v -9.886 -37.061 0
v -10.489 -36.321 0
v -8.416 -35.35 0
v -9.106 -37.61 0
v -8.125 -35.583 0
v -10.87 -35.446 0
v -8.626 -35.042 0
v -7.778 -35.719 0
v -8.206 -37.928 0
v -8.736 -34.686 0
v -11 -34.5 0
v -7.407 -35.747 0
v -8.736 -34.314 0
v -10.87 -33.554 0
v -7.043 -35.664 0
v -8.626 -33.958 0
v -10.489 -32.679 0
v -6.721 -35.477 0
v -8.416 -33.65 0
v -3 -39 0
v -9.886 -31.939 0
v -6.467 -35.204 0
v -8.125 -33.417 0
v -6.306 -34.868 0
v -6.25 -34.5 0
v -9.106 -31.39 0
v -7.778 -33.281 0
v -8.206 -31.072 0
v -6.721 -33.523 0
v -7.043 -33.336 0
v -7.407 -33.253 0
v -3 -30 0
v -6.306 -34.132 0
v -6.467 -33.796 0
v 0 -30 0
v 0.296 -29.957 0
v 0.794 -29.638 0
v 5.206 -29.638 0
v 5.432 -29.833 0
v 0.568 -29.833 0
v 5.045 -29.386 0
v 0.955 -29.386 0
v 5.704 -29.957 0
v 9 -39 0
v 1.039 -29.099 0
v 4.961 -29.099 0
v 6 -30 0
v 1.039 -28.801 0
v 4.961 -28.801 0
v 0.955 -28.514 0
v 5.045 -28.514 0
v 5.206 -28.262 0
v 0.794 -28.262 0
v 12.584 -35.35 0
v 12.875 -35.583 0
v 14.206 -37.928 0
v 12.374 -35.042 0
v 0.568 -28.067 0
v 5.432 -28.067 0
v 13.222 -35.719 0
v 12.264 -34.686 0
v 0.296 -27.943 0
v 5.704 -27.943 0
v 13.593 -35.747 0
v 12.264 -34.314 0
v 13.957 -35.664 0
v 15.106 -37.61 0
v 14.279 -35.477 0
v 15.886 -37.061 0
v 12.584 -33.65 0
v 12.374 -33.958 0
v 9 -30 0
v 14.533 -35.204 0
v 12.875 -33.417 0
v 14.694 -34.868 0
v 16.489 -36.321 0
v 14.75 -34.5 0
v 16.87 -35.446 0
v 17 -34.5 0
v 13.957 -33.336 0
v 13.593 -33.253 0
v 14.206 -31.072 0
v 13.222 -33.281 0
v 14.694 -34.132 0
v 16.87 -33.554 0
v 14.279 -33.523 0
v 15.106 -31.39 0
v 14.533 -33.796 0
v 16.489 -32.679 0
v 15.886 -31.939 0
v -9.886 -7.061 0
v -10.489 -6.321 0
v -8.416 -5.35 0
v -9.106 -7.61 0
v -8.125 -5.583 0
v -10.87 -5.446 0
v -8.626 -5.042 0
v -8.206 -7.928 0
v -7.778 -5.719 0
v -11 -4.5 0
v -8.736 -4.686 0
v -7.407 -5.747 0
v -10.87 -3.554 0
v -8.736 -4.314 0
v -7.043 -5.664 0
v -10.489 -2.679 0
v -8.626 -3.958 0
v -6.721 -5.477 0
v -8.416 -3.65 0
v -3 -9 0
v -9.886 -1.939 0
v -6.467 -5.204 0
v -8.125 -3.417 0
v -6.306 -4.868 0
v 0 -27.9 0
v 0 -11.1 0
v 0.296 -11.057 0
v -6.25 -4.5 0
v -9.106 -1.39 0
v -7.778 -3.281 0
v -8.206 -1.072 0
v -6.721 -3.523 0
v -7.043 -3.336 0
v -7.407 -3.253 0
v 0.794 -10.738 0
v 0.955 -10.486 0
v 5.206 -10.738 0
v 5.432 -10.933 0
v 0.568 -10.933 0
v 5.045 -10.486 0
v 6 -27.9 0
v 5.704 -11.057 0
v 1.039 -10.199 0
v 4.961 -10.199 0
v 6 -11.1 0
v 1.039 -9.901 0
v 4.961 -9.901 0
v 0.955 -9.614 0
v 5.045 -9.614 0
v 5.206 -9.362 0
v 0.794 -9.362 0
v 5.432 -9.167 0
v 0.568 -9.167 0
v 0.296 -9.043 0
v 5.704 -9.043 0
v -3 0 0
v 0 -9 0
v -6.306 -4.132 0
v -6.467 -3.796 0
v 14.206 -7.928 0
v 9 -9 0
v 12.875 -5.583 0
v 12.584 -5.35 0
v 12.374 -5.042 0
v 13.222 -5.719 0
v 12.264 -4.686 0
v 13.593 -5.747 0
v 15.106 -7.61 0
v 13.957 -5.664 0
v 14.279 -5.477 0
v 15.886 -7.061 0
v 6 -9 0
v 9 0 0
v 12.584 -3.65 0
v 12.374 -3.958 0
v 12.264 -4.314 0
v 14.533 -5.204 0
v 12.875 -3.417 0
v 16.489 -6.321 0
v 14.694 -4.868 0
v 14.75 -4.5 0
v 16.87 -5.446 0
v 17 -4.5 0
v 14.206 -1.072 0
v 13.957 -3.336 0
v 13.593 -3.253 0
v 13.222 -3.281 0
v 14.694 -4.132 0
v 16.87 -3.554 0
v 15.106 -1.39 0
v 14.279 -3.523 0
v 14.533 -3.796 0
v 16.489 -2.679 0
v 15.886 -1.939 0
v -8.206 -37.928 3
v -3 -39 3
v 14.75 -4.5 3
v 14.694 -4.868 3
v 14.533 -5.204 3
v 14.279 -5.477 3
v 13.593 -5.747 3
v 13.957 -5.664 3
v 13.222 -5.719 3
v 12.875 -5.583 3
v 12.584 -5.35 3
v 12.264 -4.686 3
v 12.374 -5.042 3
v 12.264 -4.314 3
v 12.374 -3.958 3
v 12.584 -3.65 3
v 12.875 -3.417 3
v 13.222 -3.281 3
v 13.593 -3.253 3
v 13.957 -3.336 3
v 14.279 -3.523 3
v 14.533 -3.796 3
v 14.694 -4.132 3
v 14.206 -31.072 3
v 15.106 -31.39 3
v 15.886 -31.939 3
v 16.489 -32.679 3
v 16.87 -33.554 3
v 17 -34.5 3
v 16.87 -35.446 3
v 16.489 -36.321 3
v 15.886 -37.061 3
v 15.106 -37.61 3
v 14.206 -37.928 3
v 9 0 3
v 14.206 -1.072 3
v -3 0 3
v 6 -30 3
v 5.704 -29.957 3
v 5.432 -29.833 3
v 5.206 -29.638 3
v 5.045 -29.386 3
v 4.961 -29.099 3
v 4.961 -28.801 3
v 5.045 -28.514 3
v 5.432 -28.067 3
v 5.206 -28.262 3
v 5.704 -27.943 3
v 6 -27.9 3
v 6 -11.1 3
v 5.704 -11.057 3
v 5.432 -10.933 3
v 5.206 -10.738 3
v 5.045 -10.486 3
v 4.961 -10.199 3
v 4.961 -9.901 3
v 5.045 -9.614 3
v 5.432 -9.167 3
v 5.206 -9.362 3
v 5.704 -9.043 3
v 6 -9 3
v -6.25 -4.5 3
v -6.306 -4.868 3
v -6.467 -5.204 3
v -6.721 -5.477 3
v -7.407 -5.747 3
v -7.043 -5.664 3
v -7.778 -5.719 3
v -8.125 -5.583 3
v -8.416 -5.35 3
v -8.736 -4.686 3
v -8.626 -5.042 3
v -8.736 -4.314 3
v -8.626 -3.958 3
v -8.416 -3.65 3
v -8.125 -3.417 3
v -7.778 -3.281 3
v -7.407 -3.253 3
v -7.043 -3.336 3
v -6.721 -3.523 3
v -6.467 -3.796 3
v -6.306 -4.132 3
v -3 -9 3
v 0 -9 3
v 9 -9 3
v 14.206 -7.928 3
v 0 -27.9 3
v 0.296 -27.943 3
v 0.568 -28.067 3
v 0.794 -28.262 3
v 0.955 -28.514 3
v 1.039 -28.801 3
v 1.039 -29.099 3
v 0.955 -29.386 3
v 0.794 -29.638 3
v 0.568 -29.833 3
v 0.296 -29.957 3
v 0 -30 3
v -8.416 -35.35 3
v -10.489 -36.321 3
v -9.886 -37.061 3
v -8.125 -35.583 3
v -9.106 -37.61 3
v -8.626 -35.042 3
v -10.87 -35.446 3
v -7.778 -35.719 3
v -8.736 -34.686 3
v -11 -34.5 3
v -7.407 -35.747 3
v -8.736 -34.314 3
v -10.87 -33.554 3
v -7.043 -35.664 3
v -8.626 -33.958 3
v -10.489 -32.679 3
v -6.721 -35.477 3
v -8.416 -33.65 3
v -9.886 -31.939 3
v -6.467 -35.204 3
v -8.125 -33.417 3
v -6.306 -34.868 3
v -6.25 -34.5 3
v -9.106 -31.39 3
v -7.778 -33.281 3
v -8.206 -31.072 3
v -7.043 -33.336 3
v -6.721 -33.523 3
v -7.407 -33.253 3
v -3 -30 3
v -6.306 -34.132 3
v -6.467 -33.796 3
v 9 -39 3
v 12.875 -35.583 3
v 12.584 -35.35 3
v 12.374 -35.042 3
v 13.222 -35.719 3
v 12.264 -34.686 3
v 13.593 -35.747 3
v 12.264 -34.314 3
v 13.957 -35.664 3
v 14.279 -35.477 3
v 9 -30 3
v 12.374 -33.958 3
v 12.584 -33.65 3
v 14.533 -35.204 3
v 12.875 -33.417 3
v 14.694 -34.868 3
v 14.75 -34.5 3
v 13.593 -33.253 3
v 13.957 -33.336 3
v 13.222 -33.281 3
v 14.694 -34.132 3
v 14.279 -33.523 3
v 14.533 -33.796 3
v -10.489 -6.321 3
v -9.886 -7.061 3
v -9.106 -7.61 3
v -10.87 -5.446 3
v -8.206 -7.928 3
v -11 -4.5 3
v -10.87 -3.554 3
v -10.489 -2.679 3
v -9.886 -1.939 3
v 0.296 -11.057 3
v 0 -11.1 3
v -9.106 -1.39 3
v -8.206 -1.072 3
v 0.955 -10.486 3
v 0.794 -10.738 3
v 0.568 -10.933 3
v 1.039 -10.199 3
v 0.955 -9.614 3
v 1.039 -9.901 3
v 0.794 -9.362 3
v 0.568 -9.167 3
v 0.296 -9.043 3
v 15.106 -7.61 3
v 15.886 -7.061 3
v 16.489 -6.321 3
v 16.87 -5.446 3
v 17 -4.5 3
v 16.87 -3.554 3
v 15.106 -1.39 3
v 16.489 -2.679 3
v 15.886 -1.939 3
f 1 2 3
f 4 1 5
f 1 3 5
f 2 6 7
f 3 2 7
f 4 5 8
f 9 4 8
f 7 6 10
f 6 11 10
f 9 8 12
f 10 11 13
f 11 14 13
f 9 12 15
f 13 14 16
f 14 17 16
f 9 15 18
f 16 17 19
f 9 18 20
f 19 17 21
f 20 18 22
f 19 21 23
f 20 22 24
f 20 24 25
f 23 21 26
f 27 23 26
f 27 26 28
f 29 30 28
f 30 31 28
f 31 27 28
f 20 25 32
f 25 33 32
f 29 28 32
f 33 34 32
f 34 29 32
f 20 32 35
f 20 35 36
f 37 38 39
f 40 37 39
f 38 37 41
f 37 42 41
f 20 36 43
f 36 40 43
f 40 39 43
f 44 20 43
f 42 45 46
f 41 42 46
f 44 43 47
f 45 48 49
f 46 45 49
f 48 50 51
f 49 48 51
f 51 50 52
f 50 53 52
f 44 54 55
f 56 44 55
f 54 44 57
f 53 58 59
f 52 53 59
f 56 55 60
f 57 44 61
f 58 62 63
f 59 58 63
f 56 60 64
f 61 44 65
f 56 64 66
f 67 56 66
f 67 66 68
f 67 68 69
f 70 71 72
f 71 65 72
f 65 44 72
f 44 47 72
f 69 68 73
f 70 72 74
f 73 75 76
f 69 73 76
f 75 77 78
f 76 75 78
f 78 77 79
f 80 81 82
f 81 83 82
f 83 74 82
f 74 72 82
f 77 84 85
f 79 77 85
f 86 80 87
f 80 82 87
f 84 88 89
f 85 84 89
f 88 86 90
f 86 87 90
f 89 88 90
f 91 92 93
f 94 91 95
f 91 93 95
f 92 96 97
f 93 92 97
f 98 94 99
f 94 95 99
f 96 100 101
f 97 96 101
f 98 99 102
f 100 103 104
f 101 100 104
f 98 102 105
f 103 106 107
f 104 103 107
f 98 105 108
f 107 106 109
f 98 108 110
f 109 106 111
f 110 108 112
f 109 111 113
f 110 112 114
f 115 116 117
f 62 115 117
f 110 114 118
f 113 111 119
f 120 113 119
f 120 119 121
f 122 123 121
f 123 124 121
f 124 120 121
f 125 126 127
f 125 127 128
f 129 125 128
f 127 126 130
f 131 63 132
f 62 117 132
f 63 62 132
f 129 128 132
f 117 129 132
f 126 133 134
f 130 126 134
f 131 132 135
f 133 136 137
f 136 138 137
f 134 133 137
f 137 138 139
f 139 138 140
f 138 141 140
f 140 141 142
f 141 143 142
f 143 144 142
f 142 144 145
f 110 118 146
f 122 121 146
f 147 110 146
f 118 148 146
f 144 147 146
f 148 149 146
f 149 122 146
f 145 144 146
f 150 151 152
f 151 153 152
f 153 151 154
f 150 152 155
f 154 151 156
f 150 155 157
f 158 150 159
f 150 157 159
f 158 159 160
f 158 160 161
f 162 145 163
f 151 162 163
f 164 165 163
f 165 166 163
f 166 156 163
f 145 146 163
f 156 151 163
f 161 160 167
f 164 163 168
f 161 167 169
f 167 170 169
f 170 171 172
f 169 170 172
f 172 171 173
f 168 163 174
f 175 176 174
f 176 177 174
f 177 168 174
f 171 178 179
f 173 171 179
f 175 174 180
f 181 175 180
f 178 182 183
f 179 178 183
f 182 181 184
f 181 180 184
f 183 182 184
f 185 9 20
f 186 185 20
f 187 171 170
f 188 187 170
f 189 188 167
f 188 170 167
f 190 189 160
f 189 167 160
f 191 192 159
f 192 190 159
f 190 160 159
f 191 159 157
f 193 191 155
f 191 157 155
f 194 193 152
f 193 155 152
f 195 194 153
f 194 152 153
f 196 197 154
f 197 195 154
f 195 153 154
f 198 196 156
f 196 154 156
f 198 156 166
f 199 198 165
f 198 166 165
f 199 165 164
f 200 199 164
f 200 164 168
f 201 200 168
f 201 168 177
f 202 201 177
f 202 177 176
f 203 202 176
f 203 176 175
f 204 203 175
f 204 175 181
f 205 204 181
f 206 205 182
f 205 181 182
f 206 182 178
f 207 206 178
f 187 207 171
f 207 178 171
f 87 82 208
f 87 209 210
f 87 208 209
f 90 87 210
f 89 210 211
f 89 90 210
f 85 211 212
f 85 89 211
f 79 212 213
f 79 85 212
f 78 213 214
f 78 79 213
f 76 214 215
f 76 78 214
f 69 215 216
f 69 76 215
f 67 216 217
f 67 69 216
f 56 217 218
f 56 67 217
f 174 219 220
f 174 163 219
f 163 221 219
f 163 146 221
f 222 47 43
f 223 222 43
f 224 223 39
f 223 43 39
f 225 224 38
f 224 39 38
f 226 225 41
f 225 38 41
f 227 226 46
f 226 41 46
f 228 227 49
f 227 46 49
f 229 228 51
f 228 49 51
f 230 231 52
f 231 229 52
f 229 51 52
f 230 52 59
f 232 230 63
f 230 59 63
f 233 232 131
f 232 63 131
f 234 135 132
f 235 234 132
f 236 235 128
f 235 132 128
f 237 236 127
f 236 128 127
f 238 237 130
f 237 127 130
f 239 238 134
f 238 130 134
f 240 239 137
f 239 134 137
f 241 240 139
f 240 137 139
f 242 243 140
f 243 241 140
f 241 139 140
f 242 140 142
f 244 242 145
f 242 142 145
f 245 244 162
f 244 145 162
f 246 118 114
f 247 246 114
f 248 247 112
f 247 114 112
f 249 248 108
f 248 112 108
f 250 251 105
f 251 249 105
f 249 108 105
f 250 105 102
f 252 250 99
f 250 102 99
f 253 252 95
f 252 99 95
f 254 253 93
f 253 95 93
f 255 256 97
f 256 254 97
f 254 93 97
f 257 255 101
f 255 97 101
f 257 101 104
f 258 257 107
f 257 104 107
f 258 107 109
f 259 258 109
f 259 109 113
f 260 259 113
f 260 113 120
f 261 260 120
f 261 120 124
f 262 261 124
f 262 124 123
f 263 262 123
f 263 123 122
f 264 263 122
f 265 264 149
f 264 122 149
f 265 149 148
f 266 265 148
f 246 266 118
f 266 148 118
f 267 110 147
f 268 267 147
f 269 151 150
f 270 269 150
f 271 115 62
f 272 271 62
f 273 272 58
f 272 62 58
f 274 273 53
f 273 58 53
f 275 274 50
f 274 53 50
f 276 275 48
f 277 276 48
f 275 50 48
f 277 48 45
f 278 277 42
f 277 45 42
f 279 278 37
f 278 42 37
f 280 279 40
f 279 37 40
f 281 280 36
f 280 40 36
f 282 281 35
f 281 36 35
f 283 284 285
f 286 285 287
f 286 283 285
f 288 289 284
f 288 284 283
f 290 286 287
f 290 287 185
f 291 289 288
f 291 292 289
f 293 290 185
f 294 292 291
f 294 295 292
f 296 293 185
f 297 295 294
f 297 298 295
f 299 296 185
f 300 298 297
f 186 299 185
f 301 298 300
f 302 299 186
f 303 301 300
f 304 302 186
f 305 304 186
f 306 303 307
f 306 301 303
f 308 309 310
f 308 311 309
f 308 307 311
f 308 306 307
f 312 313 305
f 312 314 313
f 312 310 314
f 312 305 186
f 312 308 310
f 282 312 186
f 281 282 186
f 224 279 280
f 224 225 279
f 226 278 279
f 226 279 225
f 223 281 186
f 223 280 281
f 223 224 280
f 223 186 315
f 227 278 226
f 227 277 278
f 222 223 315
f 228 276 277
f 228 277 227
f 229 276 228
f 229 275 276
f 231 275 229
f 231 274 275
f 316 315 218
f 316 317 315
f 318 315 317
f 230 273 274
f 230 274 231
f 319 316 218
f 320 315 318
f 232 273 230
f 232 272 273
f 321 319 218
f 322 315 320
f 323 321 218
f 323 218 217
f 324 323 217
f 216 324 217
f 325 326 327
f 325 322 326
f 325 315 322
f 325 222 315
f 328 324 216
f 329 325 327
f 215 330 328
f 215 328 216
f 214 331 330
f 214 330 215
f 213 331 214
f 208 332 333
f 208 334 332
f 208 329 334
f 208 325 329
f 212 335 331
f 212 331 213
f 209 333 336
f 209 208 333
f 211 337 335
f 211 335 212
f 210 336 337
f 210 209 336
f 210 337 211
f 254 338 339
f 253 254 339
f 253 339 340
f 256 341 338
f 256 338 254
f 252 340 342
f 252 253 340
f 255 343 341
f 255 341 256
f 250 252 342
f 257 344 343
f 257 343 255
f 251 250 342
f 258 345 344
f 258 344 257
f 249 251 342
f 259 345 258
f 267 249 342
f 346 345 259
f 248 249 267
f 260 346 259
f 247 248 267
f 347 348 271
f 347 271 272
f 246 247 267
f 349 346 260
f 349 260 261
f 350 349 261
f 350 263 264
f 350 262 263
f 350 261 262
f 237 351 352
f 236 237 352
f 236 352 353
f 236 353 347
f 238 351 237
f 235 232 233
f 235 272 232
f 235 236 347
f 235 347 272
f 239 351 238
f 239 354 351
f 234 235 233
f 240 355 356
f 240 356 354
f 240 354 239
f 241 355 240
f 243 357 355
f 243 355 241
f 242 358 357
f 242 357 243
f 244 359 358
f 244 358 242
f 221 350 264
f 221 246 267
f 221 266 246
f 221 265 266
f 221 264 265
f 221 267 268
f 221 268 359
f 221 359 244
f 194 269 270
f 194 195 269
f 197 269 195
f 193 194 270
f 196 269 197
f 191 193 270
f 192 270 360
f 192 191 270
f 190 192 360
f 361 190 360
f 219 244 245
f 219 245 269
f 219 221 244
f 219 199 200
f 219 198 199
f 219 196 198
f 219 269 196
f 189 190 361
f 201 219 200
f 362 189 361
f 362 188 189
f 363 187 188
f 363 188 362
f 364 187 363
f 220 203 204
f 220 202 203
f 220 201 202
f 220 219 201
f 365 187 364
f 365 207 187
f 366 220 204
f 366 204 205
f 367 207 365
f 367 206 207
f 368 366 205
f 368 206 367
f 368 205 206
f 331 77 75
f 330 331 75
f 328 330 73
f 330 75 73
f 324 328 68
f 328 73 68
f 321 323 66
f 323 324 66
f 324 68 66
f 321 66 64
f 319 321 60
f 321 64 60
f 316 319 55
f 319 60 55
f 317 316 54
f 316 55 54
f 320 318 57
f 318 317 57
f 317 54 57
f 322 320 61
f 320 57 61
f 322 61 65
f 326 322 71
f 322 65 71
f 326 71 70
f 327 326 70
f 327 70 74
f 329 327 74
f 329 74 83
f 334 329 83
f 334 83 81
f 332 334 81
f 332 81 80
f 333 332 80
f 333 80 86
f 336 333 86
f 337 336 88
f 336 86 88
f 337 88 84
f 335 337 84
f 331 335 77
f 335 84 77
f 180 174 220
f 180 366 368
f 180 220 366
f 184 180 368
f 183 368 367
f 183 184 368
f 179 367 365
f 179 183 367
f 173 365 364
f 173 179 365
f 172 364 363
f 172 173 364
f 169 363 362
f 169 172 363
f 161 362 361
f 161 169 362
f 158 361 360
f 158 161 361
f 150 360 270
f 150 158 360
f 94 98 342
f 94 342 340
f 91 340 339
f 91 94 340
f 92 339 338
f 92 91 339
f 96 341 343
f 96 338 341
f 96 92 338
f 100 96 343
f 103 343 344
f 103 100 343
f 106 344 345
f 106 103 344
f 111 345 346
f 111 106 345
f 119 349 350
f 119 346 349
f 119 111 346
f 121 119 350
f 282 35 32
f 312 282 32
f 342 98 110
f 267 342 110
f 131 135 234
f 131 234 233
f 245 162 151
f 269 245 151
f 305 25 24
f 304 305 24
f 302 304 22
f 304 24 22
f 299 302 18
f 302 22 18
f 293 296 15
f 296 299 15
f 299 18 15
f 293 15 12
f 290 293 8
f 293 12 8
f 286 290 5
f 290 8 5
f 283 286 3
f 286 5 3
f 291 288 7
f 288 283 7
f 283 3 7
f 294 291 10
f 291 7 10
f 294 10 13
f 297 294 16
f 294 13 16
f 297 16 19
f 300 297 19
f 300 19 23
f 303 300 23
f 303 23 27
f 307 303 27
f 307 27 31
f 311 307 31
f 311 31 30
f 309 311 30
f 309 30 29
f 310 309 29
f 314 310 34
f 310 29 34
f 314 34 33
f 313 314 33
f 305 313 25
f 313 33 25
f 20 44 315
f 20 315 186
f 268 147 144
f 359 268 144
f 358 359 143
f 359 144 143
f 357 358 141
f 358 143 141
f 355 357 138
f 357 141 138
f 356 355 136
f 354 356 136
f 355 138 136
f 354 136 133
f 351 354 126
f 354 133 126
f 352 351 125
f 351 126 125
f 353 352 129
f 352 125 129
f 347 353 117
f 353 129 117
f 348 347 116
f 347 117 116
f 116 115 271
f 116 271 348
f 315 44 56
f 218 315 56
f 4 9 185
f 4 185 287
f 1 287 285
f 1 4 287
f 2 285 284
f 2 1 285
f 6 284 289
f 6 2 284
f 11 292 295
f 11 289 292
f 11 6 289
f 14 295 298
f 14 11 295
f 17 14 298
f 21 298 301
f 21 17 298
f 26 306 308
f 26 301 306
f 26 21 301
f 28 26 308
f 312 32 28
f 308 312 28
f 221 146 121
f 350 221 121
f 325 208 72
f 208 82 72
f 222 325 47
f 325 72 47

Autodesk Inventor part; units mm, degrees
ref_plane "YZ Plane" through (0, 0, 0) normal (1, 0, 0) x (0, 1, 0)
ref_plane "XZ Plane" through (0, 0, 0) normal (0, 1, 0) x (-1, 0, 0)
ref_plane "XY Plane" through (0, 0, 0) normal (0, 0, 1) x (1, 0, 0)
sketch "スケッチ1" plane through (0, 0, 0) normal (0, 0, 1) x (1, 0, 0)
  line L0 (0, 0) -> (6, 0)
  line L1 (6, 0) -> (6, -39)
  line L2 (6, -39) -> (0, -39)
  line L3 (0, -39) -> (0, 0)
  line L4 (6, 0) -> (9, 0)
  circle A0 centre (13.5, -4.5) radius 1.25
  circle A1 centre (-7.5, -4.5) radius 1.25
  circle A2 centre (-7.5, -34.5) radius 1.25
  circle A3 centre (13.5, -34.5) radius 1.25
  circle A4 centre (-7.5, -4.5) radius 3.5
  circle A5 centre (13.5, -4.5) radius 3.5
  circle A6 centre (13.5, -34.5) radius 3.5
  circle A7 centre (-7.5, -34.5) radius 3.5
  line L5 (0, 0) -> (-3, 0)
  line L6 (-3, 0) -> (-8.2059, -1.0719)
  line L7 (-8.2059, -7.9281) -> (-3, -9)
  line L8 (-3, -9) -> (0, -9)
  line L9 (6, -9) -> (9, -9)
  line L10 (9, -9) -> (14.2059, -7.9281)
  line L11 (14.2059, -31.0719) -> (9, -30)
  line L12 (9, -30) -> (6, -30)
  line L13 (0, -30) -> (-3, -30)
  line L14 (-3, -30) -> (-8.2059, -31.0719)
  line L15 (-8.2059, -37.9281) -> (-3, -39)
  line L16 (-3, -39) -> (0, -39)
  line L17 (6, -39) -> (9, -39)
  line L18 (9, -39) -> (14.2059, -37.9281)
  line L19 (-7.5, -34.5) -> (13.5, -34.5) construction
  line L20 (9, 0) -> (14.2059, -1.0719)
  circle A8 centre (0, -10.05) radius 1.05
  circle A9 centre (6, -10.05) radius 1.05
  circle A10 centre (0, -28.95) radius 1.05
  circle A11 centre (6, -28.95) radius 1.05
  point P0 (0, -9)
  point P1 (0, -11.1)
  point P2 (0, -27.9)
  point P3 (6, -27.9)
  point P4 (6, -11.1)
  dimension "d0" = 6
  dimension "d1" = 39
  dimension "d2" = 3
  dimension "d3" = 2.5
  dimension "d4" = 2.5
  dimension "d5" = 2.5
  dimension "d6" = 2.5
  dimension "d7" = 7
  dimension "d8" = 7
  dimension "d9" = 7
  dimension "d10" = 7
  dimension "d11" = 3
  dimension "d12" = 3
  dimension "d13" = 3
  dimension "d14" = 3
  dimension "d15" = 3
  dimension "d16" = 3
  dimension "d19" = 4.5
  dimension "d20" = 4.5
  dimension "d21" = 7.5
  dimension "d22" = 7.5
  dimension "d23" = 3
  dimension "d24" = 7.5
  dimension "d25" = 4.5
  dimension "d26" = 7.5
  dimension "d27" = 4.5
  dimension "d28" = 2.1
  dimension "d29" = 2.1
  dimension "d30" = 2.1
  dimension "d31" = 2.1
extrude "押し出し1" add sketch "スケッチ1" along normal blind 3 contours L0 L1 A9 A11 L2 L3 A10 A8 | L3 L8 L7 A4 L6 L5 | L4 L20 A5 L10 L9 L1 | A4 | A5 | L3 L16 L15 A7 L14 L13 | L12 L11 A6 L18 L17 L1 | A7 | A6
properties part number "シールド根本留め具"
